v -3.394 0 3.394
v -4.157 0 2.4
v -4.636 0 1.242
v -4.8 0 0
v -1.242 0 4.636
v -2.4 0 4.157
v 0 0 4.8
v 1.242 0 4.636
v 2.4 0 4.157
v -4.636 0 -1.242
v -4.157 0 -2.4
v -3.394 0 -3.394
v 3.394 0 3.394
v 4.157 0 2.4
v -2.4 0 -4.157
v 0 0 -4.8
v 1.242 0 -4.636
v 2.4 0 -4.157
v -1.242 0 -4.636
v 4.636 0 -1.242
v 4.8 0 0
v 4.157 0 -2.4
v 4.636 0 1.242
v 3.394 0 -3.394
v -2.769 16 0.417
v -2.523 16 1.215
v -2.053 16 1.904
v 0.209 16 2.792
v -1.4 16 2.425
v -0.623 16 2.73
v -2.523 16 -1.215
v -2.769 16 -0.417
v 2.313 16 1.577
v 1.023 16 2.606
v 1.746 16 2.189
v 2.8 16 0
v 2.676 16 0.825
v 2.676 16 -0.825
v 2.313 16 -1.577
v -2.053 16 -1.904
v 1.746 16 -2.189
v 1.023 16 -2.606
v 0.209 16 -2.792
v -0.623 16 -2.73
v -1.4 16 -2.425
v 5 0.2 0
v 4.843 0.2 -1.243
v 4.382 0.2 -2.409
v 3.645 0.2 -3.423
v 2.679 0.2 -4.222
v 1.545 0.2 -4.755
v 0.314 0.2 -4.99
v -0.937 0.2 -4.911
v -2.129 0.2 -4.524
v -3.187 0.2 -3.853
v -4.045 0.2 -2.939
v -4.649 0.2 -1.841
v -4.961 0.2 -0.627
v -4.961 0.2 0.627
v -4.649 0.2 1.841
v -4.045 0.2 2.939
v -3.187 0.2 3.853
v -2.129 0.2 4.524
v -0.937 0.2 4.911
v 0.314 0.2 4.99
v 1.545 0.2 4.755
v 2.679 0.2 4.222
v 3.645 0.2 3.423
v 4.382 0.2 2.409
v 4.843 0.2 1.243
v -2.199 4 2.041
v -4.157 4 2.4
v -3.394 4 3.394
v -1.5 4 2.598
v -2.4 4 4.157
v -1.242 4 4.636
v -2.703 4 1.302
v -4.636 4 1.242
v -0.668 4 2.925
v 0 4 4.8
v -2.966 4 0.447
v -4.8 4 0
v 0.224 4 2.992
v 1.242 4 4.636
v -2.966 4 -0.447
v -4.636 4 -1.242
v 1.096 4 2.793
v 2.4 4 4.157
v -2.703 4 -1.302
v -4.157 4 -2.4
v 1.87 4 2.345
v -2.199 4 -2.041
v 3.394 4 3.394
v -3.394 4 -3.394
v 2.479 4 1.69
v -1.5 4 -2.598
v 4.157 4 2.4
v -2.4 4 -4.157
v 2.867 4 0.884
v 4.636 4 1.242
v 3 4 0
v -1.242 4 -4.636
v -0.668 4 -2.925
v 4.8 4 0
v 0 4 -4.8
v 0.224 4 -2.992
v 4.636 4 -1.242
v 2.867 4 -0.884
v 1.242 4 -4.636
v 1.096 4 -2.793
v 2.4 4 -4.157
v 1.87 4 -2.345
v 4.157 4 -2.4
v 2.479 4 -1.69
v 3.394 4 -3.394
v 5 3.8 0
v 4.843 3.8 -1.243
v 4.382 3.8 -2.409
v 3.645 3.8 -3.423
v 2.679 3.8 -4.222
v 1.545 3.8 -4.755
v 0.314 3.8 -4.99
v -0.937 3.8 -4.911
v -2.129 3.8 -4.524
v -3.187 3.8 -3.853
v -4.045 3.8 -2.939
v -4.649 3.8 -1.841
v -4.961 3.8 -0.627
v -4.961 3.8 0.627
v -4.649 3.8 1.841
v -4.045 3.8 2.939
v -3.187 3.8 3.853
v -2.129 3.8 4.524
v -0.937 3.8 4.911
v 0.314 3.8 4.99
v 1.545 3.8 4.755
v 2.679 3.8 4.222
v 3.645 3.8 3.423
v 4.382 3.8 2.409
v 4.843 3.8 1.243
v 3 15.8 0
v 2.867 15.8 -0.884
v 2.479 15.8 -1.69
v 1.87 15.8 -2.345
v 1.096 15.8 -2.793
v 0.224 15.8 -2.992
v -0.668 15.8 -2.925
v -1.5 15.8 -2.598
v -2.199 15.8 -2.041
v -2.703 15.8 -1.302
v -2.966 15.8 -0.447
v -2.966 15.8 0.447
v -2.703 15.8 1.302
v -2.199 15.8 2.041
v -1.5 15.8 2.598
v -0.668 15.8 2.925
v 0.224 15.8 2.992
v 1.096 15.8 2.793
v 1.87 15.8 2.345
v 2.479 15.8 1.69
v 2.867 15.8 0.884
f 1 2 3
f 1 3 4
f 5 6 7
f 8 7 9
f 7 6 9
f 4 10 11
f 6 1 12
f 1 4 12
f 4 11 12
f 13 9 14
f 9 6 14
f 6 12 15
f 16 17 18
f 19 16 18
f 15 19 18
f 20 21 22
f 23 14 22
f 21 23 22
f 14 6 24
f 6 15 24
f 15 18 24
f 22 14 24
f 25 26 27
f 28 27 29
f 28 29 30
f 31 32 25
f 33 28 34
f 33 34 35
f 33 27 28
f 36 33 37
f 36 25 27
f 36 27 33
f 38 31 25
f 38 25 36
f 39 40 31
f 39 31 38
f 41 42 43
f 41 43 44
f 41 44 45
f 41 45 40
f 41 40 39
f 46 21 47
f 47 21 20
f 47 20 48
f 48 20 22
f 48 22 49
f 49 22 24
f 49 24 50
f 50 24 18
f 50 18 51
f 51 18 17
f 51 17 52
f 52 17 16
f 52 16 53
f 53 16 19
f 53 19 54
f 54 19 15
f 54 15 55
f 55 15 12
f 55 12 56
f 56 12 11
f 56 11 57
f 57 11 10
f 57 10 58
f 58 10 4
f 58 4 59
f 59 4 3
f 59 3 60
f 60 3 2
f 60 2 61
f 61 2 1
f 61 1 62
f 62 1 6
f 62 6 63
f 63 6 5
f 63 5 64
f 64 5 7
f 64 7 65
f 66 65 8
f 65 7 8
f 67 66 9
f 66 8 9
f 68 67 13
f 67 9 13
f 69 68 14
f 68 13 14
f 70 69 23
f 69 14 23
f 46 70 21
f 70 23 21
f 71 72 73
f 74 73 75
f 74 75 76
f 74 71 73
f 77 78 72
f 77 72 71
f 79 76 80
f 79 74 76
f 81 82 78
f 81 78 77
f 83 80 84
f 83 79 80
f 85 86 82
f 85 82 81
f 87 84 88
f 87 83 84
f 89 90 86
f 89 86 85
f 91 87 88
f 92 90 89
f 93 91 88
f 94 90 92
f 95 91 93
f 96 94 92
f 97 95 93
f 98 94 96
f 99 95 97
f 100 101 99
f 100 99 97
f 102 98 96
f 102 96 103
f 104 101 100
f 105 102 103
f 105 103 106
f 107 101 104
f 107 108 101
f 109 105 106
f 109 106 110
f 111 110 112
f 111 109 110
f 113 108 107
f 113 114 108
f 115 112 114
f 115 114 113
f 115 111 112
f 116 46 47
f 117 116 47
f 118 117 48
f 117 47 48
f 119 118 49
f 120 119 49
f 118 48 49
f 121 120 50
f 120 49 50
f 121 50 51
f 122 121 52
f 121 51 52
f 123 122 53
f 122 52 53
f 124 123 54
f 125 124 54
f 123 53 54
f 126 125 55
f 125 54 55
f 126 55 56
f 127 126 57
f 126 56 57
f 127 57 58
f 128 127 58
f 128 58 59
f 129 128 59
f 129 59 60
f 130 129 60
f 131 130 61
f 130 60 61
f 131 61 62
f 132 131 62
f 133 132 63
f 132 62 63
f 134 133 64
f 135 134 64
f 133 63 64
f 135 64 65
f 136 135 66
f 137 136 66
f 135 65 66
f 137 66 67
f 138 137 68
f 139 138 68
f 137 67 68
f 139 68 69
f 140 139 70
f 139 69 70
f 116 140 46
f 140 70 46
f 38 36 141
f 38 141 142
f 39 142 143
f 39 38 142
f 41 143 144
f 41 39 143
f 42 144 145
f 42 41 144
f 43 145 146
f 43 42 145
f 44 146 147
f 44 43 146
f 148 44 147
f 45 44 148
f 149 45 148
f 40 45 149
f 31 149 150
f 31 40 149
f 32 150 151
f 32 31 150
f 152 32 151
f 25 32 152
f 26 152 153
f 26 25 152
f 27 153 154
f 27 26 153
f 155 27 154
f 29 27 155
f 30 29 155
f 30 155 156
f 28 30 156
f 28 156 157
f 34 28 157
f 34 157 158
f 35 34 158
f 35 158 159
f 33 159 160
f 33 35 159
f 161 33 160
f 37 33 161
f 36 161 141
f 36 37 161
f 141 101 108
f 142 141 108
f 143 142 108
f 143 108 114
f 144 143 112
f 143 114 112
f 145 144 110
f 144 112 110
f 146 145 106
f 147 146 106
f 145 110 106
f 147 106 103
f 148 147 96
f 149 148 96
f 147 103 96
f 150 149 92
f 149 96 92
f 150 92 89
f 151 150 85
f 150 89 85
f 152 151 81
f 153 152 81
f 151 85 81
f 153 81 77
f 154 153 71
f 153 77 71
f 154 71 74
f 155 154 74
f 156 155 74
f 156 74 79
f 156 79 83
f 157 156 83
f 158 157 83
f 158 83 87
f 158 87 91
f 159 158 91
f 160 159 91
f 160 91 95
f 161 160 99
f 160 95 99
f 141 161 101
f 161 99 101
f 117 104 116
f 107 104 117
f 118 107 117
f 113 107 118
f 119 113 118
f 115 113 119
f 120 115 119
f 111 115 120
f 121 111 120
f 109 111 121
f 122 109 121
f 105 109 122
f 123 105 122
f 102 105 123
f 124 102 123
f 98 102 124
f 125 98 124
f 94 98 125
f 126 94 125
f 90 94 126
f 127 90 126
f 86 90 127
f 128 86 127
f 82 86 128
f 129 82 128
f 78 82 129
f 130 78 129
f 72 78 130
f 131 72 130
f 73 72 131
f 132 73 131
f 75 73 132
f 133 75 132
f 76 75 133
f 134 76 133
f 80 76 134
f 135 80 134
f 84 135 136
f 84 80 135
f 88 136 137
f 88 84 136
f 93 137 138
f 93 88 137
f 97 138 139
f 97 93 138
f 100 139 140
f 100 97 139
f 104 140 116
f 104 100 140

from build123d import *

# Parameters (mm, degrees)
SKETCH_1_R      = 5
EXTRUDE_1_DEPTH = 4
SKETCH_2_R      = 3
EXTRUDE_2_DEPTH = 12
CHAMFER_1_SIZE  = 0.2


with BuildPart() as part:
    # Эскиз1 → Бобышка-Вытянуть1 (new body)
    with BuildSketch(Plane(origin=(0, 0, 0), x_dir=(1, 0, 0), z_dir=(0, 1, 0))):
        Circle(SKETCH_1_R)
    extrude(amount=EXTRUDE_1_DEPTH)

    # Эскиз2 → Бобышка-Вытянуть2 (add)
    with BuildSketch(Plane(origin=(0, 4, 0), x_dir=(1, 0, 0), z_dir=(0, 1, 0))):
        Circle(SKETCH_2_R)
    extrude(amount=EXTRUDE_2_DEPTH)

    # Фаска1
    chamfer_1_edges = [part.edges().sort_by_distance(p)[0] for p in [
        (-5, 0, 0),
        (-5, 4, 0),
        (-3, 16, 0),
    ]]
    chamfer(chamfer_1_edges, length=CHAMFER_1_SIZE)


solid = part.part
